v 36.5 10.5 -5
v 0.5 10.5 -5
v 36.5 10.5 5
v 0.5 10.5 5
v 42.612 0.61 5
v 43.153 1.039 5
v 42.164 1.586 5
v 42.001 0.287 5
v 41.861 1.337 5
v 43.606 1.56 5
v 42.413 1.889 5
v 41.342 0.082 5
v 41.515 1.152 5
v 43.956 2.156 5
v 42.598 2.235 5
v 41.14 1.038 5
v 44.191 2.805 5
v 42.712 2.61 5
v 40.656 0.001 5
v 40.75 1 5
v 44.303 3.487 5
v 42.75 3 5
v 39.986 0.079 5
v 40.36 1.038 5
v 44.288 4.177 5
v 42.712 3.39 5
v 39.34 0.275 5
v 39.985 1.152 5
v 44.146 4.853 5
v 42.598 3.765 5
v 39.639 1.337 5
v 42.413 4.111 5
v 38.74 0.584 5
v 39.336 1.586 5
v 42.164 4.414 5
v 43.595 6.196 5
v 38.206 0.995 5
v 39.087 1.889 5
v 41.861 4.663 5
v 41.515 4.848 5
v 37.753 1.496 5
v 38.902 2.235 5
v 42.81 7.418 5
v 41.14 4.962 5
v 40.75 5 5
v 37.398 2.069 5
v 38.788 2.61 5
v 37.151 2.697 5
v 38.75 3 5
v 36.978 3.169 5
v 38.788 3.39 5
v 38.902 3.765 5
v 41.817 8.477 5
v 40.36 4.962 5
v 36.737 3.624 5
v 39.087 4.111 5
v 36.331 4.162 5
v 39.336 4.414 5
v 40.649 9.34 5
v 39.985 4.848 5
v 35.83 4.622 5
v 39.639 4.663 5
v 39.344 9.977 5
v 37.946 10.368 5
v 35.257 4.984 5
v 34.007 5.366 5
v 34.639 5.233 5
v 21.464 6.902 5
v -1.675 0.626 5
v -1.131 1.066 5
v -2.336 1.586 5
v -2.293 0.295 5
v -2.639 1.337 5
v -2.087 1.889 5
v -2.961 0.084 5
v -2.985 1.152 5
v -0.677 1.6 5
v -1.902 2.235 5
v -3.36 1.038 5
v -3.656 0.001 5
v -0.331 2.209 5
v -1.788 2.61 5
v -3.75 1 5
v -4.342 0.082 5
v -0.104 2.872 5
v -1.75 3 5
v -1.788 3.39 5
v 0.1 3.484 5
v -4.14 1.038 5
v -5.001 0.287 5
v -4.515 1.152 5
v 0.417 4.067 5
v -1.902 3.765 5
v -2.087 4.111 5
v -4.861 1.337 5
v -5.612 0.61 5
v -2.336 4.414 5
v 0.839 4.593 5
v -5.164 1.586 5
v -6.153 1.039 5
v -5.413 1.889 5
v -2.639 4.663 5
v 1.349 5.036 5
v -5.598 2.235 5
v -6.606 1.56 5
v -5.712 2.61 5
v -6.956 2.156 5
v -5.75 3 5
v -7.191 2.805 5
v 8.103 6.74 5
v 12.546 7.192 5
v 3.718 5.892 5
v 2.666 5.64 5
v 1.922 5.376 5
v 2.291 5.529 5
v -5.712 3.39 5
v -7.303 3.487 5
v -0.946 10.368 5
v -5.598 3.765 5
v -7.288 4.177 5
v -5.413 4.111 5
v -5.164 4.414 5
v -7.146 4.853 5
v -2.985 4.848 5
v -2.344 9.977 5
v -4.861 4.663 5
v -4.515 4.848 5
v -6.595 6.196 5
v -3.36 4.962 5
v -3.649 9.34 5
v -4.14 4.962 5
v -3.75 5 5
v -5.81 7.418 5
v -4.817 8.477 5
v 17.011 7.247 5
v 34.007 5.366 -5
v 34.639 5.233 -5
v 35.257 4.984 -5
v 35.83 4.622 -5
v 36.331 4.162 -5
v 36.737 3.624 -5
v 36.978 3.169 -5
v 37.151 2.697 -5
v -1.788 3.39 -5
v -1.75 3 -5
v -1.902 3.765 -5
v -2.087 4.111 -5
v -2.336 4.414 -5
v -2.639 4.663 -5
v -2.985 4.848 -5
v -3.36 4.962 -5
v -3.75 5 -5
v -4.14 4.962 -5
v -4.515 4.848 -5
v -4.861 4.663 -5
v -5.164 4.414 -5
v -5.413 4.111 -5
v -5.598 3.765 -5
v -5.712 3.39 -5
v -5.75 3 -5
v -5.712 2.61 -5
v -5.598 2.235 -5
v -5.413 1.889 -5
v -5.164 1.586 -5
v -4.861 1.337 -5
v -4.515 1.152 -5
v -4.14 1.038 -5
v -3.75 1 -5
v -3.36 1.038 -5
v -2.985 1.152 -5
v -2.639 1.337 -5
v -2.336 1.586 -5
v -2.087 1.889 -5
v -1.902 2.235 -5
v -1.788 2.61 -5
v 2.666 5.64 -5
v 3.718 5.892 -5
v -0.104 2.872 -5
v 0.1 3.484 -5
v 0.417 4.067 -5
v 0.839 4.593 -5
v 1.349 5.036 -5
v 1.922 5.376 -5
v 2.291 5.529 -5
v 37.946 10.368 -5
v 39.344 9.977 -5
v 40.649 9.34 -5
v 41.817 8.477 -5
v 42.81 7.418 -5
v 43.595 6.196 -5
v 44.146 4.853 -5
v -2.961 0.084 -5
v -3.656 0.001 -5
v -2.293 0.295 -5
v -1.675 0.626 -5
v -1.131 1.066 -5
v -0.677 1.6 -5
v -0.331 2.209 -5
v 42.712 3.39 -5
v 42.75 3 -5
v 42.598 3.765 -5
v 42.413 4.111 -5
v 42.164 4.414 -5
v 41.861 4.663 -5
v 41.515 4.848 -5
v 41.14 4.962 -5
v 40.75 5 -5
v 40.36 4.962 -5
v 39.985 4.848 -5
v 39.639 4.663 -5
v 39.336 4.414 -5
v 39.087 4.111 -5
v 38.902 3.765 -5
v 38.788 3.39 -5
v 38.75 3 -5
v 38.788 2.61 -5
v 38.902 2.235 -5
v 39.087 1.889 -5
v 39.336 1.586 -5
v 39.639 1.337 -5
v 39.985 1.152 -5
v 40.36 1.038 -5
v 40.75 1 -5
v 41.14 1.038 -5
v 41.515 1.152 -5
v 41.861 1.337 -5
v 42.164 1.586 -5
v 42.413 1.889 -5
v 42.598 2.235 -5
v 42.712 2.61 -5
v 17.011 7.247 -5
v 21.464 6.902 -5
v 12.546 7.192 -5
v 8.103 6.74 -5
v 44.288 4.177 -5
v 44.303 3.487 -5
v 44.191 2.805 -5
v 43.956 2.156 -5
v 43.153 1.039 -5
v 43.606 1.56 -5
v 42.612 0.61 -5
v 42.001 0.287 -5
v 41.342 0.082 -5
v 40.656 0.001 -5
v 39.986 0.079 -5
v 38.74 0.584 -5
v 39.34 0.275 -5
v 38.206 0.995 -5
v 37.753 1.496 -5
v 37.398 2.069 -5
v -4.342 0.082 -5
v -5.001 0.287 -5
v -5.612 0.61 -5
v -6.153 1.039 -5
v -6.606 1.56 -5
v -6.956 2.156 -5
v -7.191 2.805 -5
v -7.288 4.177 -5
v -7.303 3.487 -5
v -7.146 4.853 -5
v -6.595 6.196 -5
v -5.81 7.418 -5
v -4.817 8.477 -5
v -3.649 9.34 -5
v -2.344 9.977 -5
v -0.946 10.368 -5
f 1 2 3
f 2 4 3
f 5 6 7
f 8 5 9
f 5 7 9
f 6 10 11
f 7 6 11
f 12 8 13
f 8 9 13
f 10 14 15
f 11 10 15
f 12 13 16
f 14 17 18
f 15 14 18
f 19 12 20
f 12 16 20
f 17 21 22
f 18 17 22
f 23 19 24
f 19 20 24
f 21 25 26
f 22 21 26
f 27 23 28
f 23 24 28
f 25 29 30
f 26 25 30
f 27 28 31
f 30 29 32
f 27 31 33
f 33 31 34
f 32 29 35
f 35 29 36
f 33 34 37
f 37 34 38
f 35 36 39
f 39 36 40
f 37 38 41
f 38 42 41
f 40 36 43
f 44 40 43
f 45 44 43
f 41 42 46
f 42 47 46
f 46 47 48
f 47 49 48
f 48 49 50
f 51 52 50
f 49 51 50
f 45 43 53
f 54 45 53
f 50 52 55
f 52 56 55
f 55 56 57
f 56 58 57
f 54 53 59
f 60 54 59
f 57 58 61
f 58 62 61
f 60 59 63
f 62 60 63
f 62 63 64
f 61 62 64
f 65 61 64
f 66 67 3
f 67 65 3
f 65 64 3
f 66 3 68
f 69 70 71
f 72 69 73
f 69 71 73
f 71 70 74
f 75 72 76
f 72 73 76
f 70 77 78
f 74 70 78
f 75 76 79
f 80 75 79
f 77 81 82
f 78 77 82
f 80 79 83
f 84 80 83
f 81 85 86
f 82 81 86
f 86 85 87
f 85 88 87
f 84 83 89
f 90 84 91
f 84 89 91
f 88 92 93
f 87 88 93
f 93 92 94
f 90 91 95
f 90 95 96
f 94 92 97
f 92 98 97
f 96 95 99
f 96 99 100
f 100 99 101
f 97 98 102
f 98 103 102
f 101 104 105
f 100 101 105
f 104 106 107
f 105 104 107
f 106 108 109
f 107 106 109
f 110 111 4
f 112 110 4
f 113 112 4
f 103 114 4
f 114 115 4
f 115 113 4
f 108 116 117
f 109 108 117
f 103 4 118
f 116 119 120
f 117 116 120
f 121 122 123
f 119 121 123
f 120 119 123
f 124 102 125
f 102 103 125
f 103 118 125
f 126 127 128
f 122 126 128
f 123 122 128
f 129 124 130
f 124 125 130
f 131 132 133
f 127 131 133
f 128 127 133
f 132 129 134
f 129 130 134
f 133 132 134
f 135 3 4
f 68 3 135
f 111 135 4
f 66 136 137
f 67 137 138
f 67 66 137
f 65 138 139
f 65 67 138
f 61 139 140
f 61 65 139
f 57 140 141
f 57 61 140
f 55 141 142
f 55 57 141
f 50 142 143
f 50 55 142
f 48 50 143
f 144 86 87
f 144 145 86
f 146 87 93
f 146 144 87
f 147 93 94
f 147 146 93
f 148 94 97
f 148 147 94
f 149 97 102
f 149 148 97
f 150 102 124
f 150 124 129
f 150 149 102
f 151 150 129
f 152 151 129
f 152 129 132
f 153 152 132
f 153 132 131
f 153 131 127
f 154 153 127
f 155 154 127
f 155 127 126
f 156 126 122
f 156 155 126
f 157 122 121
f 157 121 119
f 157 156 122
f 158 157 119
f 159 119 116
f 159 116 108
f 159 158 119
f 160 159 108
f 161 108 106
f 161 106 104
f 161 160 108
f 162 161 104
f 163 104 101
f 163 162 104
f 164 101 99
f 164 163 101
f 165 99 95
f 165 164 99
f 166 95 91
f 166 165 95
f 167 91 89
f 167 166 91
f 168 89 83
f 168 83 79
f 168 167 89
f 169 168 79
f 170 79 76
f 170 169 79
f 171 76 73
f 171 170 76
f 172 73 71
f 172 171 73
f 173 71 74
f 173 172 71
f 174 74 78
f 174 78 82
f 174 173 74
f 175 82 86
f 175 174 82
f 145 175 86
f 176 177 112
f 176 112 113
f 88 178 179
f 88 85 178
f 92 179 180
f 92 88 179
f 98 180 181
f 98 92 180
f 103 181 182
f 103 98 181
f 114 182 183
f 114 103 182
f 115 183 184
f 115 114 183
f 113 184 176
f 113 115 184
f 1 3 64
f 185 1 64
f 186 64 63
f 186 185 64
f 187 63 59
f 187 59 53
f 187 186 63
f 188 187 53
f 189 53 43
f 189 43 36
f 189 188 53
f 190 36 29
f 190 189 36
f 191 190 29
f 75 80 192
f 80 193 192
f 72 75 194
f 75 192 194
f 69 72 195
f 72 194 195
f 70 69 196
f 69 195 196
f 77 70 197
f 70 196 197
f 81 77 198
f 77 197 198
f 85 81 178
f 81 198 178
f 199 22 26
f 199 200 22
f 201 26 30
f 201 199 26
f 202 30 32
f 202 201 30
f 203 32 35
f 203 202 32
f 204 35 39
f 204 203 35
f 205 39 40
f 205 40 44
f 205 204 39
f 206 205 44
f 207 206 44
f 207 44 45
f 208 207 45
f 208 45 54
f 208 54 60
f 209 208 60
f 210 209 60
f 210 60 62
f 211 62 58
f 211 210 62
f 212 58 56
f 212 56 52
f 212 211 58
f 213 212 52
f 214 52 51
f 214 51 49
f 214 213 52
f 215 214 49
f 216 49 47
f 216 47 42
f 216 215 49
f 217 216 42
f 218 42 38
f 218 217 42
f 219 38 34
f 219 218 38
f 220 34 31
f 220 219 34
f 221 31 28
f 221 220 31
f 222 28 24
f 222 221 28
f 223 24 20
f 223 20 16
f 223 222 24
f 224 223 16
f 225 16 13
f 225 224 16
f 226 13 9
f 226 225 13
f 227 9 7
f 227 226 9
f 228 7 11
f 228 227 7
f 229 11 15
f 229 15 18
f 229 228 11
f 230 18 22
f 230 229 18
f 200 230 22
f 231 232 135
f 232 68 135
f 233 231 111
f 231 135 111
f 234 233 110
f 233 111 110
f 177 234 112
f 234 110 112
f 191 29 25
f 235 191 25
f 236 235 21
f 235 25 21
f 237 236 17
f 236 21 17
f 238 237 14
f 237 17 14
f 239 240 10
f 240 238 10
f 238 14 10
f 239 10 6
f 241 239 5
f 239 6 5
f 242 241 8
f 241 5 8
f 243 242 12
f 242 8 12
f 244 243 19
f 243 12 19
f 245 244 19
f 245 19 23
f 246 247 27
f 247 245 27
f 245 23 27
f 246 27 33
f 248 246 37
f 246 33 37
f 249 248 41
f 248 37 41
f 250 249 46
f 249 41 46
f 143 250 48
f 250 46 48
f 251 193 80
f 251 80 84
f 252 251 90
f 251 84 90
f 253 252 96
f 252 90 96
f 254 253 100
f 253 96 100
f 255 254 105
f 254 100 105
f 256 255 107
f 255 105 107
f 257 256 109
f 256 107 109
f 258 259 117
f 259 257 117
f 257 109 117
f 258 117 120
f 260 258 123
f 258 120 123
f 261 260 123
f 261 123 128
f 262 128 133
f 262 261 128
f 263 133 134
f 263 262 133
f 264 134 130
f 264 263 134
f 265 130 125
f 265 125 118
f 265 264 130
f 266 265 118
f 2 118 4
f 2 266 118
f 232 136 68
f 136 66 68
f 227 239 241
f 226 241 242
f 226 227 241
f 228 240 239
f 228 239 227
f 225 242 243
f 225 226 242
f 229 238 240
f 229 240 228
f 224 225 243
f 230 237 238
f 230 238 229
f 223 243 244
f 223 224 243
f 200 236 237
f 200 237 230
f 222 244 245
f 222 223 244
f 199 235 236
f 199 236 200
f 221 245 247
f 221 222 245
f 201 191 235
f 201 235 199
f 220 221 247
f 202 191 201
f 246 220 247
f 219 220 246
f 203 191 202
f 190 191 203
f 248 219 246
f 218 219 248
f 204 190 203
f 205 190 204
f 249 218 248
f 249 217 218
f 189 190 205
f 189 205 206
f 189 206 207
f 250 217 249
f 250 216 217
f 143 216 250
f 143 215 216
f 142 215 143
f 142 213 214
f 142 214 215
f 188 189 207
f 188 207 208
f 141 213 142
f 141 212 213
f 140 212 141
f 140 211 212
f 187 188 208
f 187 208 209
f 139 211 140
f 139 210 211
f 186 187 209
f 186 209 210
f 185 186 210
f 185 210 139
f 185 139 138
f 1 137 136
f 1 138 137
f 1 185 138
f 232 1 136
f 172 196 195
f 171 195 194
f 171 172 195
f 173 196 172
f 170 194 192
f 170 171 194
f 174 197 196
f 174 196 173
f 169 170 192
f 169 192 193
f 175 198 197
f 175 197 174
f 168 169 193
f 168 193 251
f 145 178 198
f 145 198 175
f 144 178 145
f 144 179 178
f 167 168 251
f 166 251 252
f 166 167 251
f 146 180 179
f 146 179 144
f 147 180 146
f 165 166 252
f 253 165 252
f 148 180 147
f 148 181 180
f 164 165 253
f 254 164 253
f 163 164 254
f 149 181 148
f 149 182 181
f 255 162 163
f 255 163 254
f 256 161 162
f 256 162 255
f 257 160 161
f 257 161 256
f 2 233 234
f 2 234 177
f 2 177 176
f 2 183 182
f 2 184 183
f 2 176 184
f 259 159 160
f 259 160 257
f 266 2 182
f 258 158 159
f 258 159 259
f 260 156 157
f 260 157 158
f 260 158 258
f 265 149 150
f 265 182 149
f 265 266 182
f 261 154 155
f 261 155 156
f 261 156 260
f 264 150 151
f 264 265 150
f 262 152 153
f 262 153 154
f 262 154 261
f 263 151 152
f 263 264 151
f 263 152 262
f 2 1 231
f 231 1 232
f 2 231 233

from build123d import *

# Parameters (mm, degrees)
SKETCH1_R           = 2
BOSS_EXTRUDE1_DEPTH = 5
FILLET1_R           = 50
FILLET2_R           = 8
FILLET3_R           = 3.75
FILLET4_R           = 3.75


with BuildPart() as part:
    # Sketch1 → Boss-Extrude1 (new, symmetric)
    with BuildSketch(Plane.XY):
        Polygon((0, 0), (-7.5, 0), (-7.5, 8), (-7.5, 10.5), (44.5, 10.5), (44.5, 8), (44.5, 0), (37, 0), (37, 5), (12.5, 8), (0, 5), align=None)
        with Locations((-3.75, 3)):
            Circle(SKETCH1_R, mode=Mode.SUBTRACT)
        with Locations((40.75, 3)):
            Circle(SKETCH1_R, mode=Mode.SUBTRACT)
    extrude(amount=BOSS_EXTRUDE1_DEPTH, both=True)

    # Fillet1
    fillet1_edges = [part.edges().sort_by_distance(p)[0] for p in [
        (12.5, 8, 0),
    ]]
    fillet(fillet1_edges, radius=FILLET1_R)

    # Fillet2
    fillet2_edges = [part.edges().sort_by_distance(p)[0] for p in [
        (-7.5, 10.5, 0),
        (44.5, 10.5, 0),
    ]]
    fillet(fillet2_edges, radius=FILLET2_R)

    # Fillet3
    # the kernel refuses this fillet: 3.75 mm, written as the material it takes off along each edge
    with BuildSketch(Plane(origin=(44.5, 0, 17.164560514), x_dir=(-0.0727207133761252, 0.997352343881573, 0), z_dir=(0, 0, -1))) as fillet3_piece_1:
        with BuildLine():
            CenterArc((4.026444062, -3.654851704), FILLET3_R, 77.065635914, 107.104635177)
            Line((0.286372773, -3.927554379), (-0.087634356, -3.954824646))
            Line((-0.087634356, -3.954824646), (-0.374007129, -0.027270268))
            Line((-0.374007129, -0.027270268), (-0.027270268, 0.374007129))
            ThreePointArc((-0.027270268, 0.374007129), (2.466110592, 0.555808912), (4.94976222, 0.36548517))
            Line((4.94976222, 0.36548517), (4.865824206, 0))
        make_face()
    extrude(amount=34.329121028, mode=Mode.SUBTRACT)
    with BuildSketch(Plane(origin=(37, 0, 14.375), x_dir=(1, 0, 0), z_dir=(0, 0, -1)), Plane(origin=(0, 0, -14.375), x_dir=(-1, 0, 0), z_dir=(0, 0, 1))) as fillet3_piece_2:
        with BuildLine():
            CenterArc((FILLET3_R, -FILLET3_R), FILLET3_R, 90, 90)
            Line((0, -FILLET3_R), (0, 0))
            Line((0, 0), (FILLET3_R, 0))
        make_face()
    extrude(amount=28.75, mode=Mode.SUBTRACT)
    with BuildSketch(Plane(origin=(-7.5, 0, 17.164560514), x_dir=(0.07272071337612518, 0.997352343881573, 0), z_dir=(0, 0, -1))) as fillet3_piece_3:
        with BuildLine():
            CenterArc((4.026444062, 3.654851704), FILLET3_R, 175.829728909, 107.104635177)
            Line((0.286372773, 3.927554379), (-0.087634356, 3.954824646))
            Line((-0.087634356, 3.954824646), (-0.374007129, 0.027270268))
            Line((-0.374007129, 0.027270268), (-0.027270268, -0.374007129))
            ThreePointArc((-0.027270268, -0.374007129), (2.466110592, -0.555808912), (4.94976222, -0.36548517))
            Line((4.94976222, -0.36548517), (4.865824206, 0))
        make_face()
    extrude(amount=34.329121028, mode=Mode.SUBTRACT)

    # Fillet4
    fillet4_edges = [part.edges().sort_by_distance(p)[0] for p in [
        (0, 5, 0),
        (37, 5, 0),
    ]]
    fillet(fillet4_edges, radius=FILLET4_R)


solid = part.part
